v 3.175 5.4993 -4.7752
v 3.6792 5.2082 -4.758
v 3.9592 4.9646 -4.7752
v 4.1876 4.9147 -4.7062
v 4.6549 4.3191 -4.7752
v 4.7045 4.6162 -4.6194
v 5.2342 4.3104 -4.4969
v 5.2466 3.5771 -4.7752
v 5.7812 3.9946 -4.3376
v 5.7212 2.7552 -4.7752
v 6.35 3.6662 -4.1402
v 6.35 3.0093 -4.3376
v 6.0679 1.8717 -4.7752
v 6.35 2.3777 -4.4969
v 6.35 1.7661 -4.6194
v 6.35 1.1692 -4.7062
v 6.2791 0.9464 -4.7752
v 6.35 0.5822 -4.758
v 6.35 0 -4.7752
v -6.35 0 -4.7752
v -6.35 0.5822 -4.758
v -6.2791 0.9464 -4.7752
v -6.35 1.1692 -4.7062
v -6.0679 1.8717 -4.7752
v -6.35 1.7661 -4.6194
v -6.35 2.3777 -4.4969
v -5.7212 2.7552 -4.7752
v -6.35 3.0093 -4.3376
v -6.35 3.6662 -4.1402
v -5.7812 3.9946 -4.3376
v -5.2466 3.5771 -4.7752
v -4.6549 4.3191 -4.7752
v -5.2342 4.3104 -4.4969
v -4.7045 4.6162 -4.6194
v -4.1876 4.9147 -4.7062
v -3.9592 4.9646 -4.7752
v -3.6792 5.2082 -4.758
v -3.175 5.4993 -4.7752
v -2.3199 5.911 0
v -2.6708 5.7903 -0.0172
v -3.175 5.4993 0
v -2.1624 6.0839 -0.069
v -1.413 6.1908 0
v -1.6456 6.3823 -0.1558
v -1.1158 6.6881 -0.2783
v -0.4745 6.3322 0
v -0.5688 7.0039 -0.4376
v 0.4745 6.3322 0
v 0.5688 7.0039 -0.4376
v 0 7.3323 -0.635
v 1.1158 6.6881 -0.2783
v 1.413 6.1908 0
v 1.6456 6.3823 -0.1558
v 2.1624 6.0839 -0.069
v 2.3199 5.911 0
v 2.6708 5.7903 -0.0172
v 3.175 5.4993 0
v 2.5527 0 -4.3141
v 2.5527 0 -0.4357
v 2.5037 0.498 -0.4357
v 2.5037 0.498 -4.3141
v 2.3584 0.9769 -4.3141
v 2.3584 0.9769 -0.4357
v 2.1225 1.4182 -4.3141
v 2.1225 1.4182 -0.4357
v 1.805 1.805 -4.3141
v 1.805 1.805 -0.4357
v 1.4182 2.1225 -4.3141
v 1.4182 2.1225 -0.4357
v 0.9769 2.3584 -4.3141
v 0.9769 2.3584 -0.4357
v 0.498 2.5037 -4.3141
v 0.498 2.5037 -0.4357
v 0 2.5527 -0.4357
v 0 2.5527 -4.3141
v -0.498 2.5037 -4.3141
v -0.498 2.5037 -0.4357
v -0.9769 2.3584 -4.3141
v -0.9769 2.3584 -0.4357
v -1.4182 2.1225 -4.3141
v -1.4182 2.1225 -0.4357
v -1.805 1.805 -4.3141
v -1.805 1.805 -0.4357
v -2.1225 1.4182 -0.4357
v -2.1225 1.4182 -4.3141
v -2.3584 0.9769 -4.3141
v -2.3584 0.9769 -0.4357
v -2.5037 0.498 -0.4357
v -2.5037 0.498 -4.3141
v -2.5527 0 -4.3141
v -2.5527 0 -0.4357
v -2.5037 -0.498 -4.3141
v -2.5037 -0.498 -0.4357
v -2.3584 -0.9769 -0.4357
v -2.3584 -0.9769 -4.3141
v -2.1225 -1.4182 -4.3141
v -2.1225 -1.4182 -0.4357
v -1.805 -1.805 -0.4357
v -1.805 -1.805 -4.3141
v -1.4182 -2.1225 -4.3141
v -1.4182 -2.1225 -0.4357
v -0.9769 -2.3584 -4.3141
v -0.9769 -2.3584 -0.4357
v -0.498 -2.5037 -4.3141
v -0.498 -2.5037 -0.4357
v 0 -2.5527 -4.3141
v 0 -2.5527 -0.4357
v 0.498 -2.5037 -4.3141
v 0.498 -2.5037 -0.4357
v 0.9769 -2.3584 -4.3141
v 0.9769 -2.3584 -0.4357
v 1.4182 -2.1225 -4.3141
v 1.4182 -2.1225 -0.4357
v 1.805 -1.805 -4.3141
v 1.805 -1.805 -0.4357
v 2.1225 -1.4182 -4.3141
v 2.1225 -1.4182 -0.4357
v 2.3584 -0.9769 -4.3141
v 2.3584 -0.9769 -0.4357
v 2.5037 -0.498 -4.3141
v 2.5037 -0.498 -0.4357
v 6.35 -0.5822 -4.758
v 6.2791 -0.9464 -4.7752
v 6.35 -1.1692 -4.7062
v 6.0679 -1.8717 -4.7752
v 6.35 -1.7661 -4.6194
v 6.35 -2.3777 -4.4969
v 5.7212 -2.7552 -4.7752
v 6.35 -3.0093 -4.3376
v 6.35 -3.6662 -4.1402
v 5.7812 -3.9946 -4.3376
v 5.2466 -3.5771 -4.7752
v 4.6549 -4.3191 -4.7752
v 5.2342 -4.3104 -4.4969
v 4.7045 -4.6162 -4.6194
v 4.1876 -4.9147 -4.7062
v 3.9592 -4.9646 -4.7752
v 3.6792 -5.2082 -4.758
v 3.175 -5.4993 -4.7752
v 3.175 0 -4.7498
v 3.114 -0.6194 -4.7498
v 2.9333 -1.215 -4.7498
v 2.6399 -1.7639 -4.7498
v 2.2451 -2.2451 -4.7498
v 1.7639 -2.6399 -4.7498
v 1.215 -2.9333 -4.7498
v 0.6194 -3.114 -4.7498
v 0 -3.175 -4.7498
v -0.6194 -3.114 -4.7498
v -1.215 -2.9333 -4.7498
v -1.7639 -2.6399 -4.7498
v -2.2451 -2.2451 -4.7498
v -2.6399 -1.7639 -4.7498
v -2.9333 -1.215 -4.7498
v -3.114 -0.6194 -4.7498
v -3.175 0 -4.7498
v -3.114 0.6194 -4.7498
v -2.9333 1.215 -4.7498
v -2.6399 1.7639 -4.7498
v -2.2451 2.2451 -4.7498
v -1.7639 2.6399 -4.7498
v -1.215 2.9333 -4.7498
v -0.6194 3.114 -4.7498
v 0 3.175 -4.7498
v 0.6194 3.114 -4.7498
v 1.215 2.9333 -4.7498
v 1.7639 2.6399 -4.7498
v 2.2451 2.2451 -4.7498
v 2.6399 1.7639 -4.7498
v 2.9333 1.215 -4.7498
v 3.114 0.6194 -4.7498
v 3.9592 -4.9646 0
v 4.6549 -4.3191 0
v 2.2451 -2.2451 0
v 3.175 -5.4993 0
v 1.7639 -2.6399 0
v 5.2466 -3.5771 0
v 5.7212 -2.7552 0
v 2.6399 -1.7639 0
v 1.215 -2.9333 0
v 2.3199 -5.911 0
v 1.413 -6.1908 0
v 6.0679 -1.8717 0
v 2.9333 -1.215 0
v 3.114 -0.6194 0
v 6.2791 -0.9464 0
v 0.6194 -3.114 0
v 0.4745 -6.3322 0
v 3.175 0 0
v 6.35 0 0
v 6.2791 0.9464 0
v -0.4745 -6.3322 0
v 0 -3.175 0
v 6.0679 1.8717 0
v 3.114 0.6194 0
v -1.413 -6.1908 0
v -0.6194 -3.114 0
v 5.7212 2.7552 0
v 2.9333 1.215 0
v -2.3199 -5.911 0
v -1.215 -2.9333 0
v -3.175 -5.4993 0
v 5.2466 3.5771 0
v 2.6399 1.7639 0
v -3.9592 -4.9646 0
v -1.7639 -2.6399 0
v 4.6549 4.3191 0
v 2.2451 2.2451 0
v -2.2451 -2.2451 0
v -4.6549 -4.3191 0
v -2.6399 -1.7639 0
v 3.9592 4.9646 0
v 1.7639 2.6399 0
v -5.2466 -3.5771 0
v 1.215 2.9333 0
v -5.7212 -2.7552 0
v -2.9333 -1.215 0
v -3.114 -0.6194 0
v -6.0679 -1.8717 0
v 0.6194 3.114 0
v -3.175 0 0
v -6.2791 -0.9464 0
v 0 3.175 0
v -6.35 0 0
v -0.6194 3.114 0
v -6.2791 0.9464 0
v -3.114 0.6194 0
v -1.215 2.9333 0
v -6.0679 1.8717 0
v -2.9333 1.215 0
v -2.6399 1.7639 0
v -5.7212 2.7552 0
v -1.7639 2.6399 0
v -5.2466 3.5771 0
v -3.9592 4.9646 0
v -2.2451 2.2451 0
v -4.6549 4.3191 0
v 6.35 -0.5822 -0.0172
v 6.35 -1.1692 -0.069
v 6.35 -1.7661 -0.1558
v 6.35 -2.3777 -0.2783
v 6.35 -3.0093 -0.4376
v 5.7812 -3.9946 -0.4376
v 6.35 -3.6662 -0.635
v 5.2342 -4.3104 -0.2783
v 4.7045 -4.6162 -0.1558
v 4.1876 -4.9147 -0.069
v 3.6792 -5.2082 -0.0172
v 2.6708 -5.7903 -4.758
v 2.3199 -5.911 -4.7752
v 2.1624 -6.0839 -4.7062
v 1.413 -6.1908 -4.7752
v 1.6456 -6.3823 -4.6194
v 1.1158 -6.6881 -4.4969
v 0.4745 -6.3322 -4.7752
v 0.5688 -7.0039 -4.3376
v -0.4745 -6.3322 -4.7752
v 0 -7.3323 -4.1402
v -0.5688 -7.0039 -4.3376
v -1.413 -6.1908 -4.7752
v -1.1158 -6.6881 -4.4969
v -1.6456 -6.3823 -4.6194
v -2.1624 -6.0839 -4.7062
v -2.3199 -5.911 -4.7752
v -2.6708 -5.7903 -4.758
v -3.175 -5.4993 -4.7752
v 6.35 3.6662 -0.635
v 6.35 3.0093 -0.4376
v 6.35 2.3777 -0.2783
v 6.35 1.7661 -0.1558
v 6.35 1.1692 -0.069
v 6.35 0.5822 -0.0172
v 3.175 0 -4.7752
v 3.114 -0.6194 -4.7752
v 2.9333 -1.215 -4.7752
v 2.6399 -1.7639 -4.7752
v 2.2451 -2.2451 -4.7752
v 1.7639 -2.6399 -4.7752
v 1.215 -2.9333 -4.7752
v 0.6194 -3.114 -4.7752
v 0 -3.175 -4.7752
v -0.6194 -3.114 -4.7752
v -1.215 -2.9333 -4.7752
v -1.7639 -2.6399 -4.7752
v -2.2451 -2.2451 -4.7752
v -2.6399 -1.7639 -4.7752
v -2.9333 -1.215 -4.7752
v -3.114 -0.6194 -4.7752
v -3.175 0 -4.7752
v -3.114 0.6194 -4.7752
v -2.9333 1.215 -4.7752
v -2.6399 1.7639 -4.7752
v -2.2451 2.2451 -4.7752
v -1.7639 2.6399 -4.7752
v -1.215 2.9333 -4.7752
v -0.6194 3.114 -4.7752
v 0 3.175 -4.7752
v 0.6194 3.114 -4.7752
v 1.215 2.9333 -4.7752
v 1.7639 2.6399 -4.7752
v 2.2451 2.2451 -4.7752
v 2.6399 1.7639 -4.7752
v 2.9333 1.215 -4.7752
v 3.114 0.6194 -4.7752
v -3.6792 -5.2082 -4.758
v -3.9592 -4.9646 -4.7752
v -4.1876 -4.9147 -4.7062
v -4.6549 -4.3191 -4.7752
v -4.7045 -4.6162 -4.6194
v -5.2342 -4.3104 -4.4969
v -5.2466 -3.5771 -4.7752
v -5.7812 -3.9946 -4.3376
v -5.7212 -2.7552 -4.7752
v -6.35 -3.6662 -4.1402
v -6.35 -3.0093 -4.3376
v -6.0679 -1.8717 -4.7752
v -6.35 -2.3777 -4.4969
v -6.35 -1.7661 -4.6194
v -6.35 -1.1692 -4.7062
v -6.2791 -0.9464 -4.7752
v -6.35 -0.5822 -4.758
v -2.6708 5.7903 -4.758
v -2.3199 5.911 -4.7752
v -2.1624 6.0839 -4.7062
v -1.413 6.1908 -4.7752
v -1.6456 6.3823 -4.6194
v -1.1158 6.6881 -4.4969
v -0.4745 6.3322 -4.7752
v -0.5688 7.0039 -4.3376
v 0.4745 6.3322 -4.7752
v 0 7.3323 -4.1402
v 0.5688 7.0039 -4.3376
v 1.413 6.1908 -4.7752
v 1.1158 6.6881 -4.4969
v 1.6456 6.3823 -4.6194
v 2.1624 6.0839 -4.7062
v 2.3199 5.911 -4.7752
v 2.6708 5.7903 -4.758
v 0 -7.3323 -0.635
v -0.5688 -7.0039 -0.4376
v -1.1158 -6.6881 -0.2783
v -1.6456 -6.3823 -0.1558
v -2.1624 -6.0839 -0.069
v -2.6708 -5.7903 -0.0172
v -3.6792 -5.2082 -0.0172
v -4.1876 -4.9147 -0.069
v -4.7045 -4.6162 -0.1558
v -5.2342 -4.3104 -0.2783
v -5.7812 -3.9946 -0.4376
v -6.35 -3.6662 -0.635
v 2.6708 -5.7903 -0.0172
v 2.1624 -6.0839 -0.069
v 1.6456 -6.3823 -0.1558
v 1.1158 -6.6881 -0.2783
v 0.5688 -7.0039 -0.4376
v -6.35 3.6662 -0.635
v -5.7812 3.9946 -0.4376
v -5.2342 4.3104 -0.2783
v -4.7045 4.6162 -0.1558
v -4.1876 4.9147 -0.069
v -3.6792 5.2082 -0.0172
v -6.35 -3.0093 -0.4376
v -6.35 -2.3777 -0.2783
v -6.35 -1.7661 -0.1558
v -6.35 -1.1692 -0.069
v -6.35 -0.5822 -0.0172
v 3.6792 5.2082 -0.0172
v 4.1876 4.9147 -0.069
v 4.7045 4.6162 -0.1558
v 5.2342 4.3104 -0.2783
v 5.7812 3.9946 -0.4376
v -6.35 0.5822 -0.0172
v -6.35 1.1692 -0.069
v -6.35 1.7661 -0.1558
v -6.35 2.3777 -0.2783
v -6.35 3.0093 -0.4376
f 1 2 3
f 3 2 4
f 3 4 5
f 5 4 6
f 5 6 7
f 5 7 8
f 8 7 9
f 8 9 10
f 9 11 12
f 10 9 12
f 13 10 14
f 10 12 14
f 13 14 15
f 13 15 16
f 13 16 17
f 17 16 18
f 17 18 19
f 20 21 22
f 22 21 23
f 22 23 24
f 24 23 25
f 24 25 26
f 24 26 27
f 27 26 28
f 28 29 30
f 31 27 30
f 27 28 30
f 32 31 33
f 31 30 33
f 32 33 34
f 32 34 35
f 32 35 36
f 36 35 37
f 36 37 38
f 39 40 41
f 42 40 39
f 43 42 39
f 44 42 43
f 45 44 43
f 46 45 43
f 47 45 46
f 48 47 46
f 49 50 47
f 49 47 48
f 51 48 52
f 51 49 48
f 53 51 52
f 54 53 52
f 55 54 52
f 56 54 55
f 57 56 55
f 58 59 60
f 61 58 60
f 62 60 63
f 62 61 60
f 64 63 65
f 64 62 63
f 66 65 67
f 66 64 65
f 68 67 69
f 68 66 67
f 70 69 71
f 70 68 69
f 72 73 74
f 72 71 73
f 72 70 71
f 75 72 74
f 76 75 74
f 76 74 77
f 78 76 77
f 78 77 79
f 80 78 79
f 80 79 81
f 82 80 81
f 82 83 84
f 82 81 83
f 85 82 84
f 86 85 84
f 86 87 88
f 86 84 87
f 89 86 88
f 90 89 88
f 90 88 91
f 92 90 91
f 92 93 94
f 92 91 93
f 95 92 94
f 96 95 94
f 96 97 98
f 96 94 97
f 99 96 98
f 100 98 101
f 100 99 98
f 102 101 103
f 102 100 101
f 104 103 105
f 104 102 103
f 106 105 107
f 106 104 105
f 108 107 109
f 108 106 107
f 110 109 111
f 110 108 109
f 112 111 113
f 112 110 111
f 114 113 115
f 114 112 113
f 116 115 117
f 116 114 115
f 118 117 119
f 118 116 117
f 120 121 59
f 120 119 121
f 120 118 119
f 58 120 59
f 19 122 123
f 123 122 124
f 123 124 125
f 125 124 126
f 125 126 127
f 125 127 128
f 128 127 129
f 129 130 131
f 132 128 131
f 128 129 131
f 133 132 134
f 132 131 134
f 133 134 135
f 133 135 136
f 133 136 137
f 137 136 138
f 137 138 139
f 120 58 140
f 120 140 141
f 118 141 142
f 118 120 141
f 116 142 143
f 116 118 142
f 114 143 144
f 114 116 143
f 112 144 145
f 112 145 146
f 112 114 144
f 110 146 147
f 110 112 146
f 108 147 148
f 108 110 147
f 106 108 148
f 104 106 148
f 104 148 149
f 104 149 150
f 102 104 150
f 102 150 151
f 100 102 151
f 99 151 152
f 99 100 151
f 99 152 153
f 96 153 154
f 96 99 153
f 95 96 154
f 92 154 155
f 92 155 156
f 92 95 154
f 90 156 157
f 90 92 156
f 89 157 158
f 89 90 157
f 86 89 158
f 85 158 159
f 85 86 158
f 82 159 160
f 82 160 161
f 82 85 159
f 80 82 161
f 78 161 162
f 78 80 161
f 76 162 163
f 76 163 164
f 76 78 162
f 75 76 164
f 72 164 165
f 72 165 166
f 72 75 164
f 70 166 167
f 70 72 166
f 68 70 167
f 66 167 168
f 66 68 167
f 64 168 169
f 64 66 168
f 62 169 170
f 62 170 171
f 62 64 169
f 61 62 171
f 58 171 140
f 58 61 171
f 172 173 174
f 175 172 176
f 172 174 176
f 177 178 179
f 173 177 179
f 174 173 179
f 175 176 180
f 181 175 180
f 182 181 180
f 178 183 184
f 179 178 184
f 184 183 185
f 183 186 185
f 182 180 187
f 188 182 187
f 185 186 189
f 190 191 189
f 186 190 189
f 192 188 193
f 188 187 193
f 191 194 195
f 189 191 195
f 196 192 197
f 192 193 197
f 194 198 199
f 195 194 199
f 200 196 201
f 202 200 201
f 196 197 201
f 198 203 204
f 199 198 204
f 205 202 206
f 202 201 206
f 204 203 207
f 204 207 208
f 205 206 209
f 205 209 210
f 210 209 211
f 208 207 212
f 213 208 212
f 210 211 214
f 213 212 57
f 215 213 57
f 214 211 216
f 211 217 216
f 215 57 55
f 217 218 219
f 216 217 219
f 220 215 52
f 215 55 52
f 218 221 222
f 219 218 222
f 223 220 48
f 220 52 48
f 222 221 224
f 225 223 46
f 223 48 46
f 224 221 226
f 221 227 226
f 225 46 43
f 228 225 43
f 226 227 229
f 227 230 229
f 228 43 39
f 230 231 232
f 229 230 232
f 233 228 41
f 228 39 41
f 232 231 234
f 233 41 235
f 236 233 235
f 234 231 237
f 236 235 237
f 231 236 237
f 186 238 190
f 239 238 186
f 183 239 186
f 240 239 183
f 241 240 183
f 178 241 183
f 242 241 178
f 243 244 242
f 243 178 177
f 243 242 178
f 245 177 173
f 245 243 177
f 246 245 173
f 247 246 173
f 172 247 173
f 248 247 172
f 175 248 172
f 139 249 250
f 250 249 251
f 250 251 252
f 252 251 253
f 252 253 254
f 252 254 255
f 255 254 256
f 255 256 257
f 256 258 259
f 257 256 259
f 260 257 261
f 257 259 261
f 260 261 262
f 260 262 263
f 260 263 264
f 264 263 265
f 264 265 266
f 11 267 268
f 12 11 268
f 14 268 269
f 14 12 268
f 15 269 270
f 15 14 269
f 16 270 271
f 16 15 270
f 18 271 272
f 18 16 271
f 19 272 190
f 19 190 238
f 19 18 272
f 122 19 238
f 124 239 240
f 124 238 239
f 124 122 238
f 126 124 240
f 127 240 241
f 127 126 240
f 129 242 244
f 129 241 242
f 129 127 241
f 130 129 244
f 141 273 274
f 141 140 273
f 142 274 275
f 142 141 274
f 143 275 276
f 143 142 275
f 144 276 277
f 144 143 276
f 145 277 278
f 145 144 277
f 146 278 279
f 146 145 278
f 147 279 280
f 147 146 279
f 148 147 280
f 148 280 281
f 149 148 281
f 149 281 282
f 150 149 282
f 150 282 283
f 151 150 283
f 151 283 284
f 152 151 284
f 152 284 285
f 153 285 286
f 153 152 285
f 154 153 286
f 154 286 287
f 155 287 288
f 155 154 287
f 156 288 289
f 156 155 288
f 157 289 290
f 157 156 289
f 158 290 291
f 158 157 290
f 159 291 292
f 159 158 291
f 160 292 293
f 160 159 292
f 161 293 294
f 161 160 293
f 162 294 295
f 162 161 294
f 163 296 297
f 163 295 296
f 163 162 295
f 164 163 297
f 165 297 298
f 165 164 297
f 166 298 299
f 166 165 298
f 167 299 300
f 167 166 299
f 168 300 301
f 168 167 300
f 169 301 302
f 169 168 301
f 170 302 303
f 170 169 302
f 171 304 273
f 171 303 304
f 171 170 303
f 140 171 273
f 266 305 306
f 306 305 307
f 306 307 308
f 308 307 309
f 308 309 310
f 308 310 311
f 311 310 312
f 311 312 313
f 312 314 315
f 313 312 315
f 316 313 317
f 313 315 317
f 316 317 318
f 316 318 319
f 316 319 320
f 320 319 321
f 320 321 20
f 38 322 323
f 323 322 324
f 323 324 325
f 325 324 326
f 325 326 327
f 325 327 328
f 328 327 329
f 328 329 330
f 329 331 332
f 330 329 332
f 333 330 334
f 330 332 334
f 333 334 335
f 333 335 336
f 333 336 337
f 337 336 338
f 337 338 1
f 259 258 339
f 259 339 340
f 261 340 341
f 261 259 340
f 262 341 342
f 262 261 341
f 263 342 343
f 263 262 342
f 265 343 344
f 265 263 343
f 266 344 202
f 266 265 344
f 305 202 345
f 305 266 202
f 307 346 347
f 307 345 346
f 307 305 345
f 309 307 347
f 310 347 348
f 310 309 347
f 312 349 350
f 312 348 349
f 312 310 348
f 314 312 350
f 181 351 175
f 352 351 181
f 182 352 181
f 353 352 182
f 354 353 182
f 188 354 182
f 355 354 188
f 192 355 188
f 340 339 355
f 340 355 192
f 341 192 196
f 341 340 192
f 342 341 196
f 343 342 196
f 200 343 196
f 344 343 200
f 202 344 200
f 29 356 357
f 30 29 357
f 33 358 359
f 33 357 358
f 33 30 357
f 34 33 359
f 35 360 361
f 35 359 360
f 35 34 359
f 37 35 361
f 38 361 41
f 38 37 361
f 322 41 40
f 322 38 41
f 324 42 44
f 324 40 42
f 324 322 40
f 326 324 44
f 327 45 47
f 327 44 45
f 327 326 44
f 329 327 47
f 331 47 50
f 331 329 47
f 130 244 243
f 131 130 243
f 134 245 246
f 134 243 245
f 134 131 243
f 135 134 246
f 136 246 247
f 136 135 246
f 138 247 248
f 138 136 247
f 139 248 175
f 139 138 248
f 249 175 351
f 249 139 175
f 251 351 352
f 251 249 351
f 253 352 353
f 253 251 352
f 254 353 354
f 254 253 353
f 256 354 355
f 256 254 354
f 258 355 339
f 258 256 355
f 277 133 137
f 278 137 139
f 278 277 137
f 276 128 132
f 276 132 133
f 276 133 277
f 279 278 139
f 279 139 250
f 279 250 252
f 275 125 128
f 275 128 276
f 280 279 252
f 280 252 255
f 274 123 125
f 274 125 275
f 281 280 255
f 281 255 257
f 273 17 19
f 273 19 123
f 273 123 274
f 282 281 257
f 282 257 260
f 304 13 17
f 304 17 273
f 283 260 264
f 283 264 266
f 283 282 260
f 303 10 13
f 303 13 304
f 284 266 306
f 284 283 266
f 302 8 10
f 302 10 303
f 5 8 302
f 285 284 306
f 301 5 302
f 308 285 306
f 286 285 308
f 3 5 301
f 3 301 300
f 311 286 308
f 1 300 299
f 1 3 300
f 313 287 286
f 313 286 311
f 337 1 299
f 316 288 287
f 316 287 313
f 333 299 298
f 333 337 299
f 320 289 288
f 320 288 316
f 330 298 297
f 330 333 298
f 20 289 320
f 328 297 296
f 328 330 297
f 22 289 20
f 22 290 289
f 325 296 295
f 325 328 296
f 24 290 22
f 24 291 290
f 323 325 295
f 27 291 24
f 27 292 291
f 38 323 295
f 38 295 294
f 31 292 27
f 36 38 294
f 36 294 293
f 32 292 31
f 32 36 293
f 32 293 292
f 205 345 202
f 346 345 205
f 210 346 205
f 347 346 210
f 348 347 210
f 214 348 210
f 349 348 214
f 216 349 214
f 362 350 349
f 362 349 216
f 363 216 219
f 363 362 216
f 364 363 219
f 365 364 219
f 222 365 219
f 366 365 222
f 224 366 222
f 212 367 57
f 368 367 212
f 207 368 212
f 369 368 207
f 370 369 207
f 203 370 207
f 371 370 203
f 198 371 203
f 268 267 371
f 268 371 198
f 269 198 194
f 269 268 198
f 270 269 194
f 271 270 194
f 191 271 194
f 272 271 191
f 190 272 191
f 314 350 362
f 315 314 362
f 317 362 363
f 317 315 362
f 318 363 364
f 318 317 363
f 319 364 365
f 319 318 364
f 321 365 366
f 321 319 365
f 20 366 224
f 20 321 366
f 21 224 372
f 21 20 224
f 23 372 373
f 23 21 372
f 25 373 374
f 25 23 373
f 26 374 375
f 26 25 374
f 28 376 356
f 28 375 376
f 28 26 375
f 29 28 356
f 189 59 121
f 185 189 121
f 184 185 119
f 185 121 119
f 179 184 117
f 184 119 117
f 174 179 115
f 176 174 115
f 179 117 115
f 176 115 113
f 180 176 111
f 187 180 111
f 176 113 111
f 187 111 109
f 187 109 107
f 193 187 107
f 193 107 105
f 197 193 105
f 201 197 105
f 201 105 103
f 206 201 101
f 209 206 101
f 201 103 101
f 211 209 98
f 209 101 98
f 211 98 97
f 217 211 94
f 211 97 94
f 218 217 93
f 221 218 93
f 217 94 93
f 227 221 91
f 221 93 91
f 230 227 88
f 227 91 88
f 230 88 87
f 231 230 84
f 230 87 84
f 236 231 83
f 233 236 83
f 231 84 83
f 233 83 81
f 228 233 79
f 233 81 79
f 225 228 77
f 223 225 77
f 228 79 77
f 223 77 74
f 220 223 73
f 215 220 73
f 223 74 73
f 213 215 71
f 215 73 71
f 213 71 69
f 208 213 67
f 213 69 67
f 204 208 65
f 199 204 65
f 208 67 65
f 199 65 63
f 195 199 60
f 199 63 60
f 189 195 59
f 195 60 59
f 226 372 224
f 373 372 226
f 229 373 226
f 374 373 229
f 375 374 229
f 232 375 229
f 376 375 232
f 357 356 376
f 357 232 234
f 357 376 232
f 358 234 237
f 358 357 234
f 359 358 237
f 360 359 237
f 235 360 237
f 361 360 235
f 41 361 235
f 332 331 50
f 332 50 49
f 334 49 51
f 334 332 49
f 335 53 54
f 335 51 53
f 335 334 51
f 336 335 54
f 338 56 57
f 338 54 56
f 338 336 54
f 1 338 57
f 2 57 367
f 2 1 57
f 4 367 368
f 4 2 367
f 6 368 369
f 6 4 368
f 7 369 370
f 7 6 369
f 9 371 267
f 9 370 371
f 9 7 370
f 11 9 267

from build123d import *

# Parameters (mm, degrees)
BASENUT_START = -4.7752
BASENUTSKE_R  = 2.5527
BASENUT_DEPTH = 4.7752


with BuildPart() as part:
    # BaseNutSke → BaseNut (new body)
    with BuildSketch(Plane.XY.offset(BASENUT_START)):
        Polygon((6.35, 3.666174209), (6.35, -3.666174209), (0, -7.332348419), (-6.35, -3.666174209), (-6.35, 3.666174209), (0, 7.332348419), align=None)
        Circle(BASENUTSKE_R, mode=Mode.SUBTRACT)
    extrude(amount=BASENUT_DEPTH)

    # Sketch3 → Double-Chamfer (revolve, cut)
    with BuildSketch(Plane(origin=(0, 0, 0), x_dir=(0, 0, -1), z_dir=(1, 0, 0))):
        Polygon((4.7752, 6.35), (4.1402, 7.332348419), (4.1402, 20.032348419), (17.4752, 20.032348419), (17.4752, 6.35), align=None)
        Polygon((0.635, 20.032348419), (-12.7, 20.032348419), (-12.7, 6.35), (0, 6.35), (0.635, 7.332348419), align=None)
    revolve(axis=Axis((0, 0, 0), (0, 0, -1)), mode=Mode.SUBTRACT)

    # EndChamferSke → EndChamfer (revolve, cut)
    with BuildSketch(Plane(origin=(0, 0, 0), x_dir=(0, 0, -1), z_dir=(1, 0, 0)), mode=Mode.PRIVATE) as endchamfer_sk:
        Polygon((4.7498, 3.175), (4.270486934, 2.49047), (4.8006, 2.49047), (4.8006, 3.175), align=None)
        Polygon((-0.0508, 3.175), (0, 3.175), (0.479313066, 2.49047), (-0.0508, 2.49047), align=None)
    revolve(endchamfer_sk.sketch.rotate(Axis((0, 0, -25.037505729), (0, 0, -1)), 90), axis=Axis((0, 0, -25.037505729), (0, 0, -1)), mode=Mode.SUBTRACT)


solid = part.part
